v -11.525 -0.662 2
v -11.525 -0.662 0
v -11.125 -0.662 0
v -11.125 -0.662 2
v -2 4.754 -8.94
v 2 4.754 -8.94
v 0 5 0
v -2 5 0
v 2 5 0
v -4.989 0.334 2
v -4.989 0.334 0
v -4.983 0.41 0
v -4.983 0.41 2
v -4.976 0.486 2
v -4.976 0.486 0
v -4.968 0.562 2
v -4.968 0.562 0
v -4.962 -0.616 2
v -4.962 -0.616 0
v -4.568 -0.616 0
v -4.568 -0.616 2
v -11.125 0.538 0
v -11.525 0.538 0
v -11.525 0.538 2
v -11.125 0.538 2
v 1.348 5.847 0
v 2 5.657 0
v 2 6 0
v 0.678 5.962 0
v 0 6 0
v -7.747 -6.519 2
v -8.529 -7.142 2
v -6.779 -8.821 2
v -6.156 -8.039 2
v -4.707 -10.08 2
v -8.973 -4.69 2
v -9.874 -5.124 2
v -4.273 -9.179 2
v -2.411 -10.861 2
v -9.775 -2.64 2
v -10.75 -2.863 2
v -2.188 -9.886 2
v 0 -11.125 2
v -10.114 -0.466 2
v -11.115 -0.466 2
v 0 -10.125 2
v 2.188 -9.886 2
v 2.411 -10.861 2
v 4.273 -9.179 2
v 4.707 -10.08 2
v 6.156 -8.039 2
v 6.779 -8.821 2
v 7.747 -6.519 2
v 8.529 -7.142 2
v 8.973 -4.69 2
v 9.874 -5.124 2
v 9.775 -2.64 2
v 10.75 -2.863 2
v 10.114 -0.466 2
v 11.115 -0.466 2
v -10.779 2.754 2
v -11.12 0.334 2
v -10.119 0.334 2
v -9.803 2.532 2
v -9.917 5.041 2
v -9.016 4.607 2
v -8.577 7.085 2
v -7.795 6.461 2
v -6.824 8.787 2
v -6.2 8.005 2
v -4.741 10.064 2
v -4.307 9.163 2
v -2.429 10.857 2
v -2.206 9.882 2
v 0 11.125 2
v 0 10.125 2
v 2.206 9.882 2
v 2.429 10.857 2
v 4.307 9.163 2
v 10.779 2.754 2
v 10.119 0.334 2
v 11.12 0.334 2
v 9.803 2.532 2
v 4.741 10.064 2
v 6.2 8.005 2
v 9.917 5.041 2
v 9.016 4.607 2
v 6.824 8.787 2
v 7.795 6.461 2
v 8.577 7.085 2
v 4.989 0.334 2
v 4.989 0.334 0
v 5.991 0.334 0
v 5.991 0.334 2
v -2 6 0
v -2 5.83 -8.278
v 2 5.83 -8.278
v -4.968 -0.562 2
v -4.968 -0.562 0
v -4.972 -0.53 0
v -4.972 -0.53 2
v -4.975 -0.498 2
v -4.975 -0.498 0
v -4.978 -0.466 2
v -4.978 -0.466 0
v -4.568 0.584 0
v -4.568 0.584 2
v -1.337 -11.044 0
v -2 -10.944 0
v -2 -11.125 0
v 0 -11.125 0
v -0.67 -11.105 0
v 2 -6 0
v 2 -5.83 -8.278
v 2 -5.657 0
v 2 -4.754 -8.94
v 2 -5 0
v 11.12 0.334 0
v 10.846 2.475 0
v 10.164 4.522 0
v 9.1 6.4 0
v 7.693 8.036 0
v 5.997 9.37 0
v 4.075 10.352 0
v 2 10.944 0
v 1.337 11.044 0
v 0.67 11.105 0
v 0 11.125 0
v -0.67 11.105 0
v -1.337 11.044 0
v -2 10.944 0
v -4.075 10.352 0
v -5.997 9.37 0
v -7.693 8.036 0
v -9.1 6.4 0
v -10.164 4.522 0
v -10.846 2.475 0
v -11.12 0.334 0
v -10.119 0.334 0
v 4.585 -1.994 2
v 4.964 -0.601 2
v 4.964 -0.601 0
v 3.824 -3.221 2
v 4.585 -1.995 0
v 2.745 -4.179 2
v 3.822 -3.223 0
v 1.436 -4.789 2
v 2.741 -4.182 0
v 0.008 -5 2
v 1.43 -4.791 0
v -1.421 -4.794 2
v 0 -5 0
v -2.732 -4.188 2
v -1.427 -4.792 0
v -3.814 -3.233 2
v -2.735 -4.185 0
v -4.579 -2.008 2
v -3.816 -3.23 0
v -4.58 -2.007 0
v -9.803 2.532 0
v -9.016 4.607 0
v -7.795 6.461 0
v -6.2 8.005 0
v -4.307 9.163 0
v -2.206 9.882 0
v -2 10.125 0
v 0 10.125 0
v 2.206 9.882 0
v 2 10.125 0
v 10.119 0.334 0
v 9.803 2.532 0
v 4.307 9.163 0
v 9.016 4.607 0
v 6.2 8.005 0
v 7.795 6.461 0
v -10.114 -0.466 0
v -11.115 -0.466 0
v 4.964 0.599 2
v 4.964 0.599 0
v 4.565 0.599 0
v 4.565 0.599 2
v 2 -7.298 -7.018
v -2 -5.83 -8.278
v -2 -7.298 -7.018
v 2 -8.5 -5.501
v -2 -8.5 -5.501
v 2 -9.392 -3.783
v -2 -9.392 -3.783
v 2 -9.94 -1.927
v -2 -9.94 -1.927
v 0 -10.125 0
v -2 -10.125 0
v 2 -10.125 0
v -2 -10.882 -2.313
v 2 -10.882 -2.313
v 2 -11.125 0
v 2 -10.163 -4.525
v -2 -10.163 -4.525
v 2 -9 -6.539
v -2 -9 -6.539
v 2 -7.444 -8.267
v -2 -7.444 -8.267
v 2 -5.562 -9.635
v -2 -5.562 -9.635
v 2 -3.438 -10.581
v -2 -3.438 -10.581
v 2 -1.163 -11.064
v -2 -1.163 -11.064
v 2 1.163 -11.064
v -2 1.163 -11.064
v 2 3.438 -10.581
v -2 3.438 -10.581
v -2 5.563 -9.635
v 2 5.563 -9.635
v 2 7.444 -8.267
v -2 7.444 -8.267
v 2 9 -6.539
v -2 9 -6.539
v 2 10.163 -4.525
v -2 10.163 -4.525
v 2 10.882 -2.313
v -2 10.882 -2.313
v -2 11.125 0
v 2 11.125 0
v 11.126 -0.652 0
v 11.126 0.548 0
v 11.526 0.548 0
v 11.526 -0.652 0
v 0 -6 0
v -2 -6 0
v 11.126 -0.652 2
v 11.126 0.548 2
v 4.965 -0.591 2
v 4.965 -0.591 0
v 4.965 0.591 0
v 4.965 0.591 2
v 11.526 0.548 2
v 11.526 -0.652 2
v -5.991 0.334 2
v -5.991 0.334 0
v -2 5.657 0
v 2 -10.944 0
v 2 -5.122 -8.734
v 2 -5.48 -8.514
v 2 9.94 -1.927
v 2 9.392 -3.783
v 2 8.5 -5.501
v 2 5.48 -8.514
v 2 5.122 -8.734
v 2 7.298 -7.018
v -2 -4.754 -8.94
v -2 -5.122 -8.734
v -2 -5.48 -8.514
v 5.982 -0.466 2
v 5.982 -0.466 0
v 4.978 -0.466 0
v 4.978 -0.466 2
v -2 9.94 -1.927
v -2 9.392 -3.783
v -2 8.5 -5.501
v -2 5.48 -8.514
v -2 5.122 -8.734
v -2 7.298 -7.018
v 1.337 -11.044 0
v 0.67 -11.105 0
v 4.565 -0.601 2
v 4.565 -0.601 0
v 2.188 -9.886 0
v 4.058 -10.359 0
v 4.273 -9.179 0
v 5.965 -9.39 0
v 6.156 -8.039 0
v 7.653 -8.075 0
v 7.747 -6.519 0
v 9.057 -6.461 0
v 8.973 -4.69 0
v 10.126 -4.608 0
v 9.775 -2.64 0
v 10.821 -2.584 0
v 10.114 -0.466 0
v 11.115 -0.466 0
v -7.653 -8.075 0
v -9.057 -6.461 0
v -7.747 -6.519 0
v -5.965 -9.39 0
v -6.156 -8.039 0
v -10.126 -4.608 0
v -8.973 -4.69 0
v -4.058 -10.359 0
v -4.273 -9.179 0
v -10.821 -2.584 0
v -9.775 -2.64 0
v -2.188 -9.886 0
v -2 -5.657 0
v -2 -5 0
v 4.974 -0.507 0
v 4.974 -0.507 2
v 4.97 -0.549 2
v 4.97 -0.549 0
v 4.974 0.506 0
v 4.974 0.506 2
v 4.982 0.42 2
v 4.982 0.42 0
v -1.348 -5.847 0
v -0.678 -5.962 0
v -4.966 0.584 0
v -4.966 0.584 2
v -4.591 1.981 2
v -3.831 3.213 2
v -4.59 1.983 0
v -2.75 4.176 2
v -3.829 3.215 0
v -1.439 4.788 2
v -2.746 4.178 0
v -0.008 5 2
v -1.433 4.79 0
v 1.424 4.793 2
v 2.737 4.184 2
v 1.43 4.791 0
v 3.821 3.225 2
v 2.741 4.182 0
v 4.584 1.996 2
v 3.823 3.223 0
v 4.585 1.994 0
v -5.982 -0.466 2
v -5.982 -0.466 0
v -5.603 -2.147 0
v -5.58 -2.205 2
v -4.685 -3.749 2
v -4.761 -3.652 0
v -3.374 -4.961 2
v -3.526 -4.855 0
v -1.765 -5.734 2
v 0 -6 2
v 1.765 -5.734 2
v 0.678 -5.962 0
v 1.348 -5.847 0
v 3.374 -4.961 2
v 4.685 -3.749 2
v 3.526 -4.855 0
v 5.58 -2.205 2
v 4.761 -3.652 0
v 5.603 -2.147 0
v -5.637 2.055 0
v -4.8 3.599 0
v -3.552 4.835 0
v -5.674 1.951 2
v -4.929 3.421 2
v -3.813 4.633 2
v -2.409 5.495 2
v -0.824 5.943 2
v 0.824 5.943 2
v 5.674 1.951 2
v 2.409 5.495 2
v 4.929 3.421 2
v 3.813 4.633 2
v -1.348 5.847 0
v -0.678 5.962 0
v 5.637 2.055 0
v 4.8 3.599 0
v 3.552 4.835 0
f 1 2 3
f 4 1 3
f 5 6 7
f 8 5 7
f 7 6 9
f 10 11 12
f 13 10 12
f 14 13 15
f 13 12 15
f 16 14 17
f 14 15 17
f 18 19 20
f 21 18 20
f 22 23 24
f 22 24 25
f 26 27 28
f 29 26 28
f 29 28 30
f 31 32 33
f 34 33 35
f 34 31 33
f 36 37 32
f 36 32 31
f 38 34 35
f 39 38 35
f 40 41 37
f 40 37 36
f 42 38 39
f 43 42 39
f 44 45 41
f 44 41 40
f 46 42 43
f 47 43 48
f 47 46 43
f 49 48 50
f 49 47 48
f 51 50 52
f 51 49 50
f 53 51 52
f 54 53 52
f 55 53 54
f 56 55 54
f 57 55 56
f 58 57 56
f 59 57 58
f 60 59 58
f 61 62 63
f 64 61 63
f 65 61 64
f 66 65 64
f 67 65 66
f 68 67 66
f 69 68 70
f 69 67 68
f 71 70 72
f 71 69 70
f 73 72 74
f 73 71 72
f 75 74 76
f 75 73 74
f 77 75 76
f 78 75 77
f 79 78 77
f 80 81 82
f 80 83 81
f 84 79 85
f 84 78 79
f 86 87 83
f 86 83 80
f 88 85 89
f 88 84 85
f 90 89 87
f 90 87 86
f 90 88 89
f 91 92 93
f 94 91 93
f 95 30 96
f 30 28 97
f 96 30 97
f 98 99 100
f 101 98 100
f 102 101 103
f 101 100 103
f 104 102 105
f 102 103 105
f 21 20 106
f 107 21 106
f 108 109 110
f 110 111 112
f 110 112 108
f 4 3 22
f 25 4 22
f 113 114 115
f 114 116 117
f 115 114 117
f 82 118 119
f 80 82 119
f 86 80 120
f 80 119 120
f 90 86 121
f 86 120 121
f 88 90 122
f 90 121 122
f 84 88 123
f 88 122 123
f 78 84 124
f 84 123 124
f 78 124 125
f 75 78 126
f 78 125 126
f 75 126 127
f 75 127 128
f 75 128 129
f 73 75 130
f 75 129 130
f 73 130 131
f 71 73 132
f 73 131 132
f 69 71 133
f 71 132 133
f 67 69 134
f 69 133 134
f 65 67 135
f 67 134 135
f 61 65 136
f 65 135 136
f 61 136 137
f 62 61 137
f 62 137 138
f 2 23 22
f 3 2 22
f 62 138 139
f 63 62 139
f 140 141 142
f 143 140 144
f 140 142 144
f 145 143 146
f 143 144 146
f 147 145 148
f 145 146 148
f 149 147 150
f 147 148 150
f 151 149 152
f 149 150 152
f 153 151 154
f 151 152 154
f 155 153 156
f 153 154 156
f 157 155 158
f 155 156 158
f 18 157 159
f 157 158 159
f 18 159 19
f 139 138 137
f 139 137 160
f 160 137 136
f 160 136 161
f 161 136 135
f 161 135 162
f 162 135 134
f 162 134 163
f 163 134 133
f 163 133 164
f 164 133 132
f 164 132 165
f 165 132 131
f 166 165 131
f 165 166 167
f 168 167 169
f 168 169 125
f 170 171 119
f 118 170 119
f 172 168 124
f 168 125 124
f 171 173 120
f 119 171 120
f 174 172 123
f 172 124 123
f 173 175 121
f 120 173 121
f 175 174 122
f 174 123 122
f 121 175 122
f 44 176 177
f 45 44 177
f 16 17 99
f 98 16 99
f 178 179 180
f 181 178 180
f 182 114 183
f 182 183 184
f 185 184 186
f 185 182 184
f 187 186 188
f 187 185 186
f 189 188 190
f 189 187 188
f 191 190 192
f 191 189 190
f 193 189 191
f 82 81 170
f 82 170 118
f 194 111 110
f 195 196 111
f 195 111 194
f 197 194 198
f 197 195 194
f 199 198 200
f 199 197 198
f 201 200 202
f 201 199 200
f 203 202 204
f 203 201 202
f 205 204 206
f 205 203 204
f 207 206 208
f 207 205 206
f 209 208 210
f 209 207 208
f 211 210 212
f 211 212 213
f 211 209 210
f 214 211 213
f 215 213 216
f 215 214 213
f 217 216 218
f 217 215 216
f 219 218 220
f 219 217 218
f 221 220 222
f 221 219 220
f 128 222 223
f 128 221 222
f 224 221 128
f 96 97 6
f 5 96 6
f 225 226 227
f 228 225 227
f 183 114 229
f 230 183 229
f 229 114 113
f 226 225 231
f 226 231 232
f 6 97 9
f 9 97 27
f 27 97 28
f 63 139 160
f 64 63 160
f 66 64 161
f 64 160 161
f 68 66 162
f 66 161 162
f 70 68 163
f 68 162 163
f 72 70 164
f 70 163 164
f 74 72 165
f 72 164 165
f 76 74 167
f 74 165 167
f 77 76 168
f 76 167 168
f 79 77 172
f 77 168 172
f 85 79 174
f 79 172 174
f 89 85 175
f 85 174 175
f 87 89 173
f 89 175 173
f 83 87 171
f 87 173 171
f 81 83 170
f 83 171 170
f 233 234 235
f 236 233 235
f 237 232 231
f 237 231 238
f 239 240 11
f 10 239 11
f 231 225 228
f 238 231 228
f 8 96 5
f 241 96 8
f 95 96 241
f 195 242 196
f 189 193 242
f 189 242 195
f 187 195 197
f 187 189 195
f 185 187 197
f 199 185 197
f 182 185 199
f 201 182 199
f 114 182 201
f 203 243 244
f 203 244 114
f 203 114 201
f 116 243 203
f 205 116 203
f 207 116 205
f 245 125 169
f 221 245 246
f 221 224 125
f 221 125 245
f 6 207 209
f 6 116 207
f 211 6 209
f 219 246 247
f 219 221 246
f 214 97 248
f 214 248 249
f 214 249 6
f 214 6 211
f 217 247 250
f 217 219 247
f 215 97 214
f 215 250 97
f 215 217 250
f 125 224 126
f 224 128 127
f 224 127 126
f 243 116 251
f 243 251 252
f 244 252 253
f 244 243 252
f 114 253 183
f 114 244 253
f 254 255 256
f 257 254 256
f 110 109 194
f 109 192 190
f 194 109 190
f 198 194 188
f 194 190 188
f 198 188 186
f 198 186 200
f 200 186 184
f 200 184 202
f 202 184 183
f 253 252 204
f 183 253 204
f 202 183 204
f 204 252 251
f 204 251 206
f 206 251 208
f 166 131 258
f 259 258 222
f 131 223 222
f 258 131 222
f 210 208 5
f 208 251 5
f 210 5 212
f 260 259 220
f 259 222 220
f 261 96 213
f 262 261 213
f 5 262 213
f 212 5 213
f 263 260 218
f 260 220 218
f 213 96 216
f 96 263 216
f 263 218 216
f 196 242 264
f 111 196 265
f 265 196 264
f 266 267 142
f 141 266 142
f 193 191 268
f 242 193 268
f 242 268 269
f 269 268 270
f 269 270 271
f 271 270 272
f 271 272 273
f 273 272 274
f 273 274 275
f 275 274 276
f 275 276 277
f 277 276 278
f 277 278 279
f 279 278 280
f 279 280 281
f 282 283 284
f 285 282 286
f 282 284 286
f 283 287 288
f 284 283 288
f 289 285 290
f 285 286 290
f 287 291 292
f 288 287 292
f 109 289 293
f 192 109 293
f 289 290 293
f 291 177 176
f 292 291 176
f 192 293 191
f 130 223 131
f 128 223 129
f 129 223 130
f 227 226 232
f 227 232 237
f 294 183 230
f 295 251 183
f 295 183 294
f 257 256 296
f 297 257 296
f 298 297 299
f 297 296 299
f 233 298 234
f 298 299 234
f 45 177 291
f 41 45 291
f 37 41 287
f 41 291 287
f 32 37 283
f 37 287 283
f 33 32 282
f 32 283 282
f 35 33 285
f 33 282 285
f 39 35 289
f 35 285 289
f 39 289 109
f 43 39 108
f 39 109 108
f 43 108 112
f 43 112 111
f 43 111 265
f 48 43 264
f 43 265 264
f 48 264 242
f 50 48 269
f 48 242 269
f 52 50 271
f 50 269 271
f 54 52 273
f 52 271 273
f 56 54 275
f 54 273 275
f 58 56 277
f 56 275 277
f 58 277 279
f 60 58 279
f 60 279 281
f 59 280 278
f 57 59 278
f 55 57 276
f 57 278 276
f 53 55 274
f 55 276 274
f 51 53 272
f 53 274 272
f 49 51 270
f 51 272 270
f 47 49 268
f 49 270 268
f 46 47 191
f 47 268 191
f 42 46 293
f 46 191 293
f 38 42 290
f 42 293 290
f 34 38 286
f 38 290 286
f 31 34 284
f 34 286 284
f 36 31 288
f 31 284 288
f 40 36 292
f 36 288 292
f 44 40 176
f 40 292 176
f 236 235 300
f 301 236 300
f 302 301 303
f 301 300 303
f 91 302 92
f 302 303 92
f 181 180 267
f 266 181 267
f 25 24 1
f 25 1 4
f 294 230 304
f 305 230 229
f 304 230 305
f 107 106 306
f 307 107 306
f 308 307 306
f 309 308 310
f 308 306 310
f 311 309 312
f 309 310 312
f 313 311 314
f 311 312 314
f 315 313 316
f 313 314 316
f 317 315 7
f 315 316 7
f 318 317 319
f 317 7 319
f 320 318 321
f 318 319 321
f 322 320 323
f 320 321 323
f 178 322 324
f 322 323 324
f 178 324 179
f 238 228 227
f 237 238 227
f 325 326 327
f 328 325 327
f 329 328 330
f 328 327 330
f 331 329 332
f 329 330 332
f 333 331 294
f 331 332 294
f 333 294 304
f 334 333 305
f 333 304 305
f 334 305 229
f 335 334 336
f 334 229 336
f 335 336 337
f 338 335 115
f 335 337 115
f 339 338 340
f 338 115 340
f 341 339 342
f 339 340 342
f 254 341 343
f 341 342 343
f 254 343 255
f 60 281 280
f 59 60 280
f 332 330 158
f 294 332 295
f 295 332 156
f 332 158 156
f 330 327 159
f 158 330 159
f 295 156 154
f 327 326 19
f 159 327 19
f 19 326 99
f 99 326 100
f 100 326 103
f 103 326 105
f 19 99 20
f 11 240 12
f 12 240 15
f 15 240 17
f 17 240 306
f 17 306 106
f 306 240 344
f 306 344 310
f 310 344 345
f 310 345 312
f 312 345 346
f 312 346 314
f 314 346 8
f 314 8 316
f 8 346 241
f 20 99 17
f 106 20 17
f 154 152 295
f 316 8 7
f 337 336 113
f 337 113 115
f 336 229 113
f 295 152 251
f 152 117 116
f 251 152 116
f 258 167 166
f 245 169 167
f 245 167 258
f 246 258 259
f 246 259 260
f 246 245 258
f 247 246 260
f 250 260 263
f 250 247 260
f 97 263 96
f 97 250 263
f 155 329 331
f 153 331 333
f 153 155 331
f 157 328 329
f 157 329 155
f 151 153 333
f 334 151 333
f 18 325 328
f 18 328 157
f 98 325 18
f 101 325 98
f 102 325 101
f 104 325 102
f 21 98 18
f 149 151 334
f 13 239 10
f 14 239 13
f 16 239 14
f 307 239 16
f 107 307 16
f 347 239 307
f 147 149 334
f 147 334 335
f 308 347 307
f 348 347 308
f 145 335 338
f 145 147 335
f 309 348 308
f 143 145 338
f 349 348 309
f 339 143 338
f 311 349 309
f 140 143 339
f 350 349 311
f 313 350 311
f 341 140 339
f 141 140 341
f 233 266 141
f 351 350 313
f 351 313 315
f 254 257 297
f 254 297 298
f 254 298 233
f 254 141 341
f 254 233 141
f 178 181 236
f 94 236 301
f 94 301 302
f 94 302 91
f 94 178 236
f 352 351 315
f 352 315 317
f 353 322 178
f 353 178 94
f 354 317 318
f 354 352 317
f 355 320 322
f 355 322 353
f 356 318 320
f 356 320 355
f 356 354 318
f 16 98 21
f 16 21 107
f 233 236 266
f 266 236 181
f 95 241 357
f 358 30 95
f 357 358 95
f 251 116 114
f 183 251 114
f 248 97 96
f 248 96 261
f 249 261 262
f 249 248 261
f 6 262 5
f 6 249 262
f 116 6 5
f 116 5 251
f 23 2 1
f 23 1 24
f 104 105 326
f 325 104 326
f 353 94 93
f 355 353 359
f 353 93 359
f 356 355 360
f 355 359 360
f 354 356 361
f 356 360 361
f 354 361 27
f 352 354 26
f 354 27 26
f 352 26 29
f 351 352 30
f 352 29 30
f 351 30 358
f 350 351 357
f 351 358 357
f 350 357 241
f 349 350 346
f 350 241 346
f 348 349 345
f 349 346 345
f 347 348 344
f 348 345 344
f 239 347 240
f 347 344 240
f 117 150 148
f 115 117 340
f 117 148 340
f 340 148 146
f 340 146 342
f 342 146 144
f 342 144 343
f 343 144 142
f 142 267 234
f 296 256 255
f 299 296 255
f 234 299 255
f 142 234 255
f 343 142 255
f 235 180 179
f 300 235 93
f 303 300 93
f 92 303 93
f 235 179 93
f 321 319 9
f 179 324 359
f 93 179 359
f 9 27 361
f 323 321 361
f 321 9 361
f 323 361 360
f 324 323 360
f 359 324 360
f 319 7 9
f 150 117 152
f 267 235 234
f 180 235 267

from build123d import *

# Parameters (mm, degrees)
SKETCH1_W             = 0.4
SKETCH1_H             = 1.2
BOSS_EXTRUDE6_DEPTH   = 2
BOSS_EXTRUDE6_2_DEPTH = 2
BOSS_EXTRUDE6_3_DEPTH = 2
BOSS_EXTRUDE6_4_DEPTH = 2
BOSS_EXTRUDE6_5_DEPTH = 2
BOSS_EXTRUDE9_DEPTH   = 2


with BuildPart() as part:
    # Sketch1 → Boss-Extrude6 (new body)
    with BuildSketch(Plane.XY):
        with Locations((11.325734145, -0.052379551)):
            Rectangle(SKETCH1_W, SKETCH1_H)
    extrude(amount=BOSS_EXTRUDE6_DEPTH)


with BuildPart() as body_2:
    # Sketch1 → Boss-Extrude6 2 (new body)
    with BuildSketch(Plane.XY):
        with BuildLine():
            Line((10.119474502, 0.334455981), (11.119971412, 0.334455981))
            ThreePointArc((11.119971412, 0.334455981), (0, 11.125), (-11.119971412, 0.334455981))
            Line((-11.119971412, 0.334455981), (-10.119474502, 0.334455981))
            ThreePointArc((-10.119474502, 0.334455981), (0, 10.125), (10.119474502, 0.334455981))
        make_face()
    extrude(amount=BOSS_EXTRUDE6_2_DEPTH)



with BuildPart() as body_3:
    # Sketch1 → Boss-Extrude6 3 (new body)
    with BuildSketch(Plane.XY):
        with BuildLine():
            ThreePointArc((-11.115255002, -0.465544019), (0, -11.125), (11.115255002, -0.465544019))
            Line((11.115255002, -0.465544019), (10.11429156, -0.465544019))
            ThreePointArc((10.11429156, -0.465544019), (0, -10.125), (-10.11429156, -0.465544019))
            Line((-10.11429156, -0.465544019), (-11.115255002, -0.465544019))
        make_face()
    extrude(amount=BOSS_EXTRUDE6_3_DEPTH)


with BuildPart() as body_4:
    # Sketch1 → Boss-Extrude6 4 (new body)
    with BuildSketch(Plane.XY):
        with BuildLine():
            Line((-4.96832272, 0.561933585), (-4.96832272, -0.561933585))
            ThreePointArc((-4.96832272, -0.561933585), (-4.973534725, -0.513762924), (-4.978279699, -0.465544019))
            Line((-4.978279699, -0.465544019), (-5.981911799, -0.465544019))
            ThreePointArc((-5.981911799, -0.465544019), (0, -6), (5.981911799, -0.465544019))
            Line((5.981911799, -0.465544019), (4.978279699, -0.465544019))
            ThreePointArc((4.978279699, -0.465544019), (4.972008711, -0.528326962), (4.964945975, -0.591025774))
            Line((4.964945975, -0.591025774), (4.964945975, 0.591025774))
            ThreePointArc((4.964945975, 0.591025774), (4.978526751, 0.462894577), (4.988801379, 0.334455981))
            Line((4.988801379, 0.334455981), (5.990671014, 0.334455981))
            ThreePointArc((5.990671014, 0.334455981), (0, 6), (-5.990671014, 0.334455981))
            Line((-5.990671014, 0.334455981), (-4.988801379, 0.334455981))
            ThreePointArc((-4.988801379, 0.334455981), (-4.979861102, 0.44831173), (-4.96832272, 0.561933585))
        make_face()
        with BuildLine():
            ThreePointArc((4.963778954, -0.600748279), (0.007811541, -4.999993898), (-4.961877617, -0.616255233))
            Line((-4.961877617, -0.616255233), (-4.56832272, -0.616255233))
            Line((-4.56832272, -0.616255233), (-4.56832272, 0.583744767))
            Line((-4.56832272, 0.583744767), (-4.965807291, 0.583744767))
            ThreePointArc((-4.965807291, 0.583744767), (-0.007808307, 4.999993903), (4.963959848, 0.599251721))
            Line((4.963959848, 0.599251721), (4.564945975, 0.599251721))
            Line((4.564945975, 0.599251721), (4.564945975, -0.600748279))
            Line((4.564945975, -0.600748279), (4.963778954, -0.600748279))
        make_face(mode=Mode.SUBTRACT)
    extrude(amount=BOSS_EXTRUDE6_4_DEPTH)


with BuildPart() as body_5:
    # Sketch1 → Boss-Extrude6 5 (new body)
    with BuildSketch(Plane.XY):
        with Locations((-11.324786406, -0.061923137)):
            Rectangle(SKETCH1_W, SKETCH1_H)
    extrude(amount=BOSS_EXTRUDE6_5_DEPTH)


with BuildPart() as body_2_1:
    add(body_2.part)

    add(body_3.part)  # Boss-Extrude9 merges body 3

    add(body_4.part)  # Boss-Extrude9 merges body 4
    # Sketch7 → Boss-Extrude9 (add, symmetric)
    with BuildSketch(Plane(origin=(0, 0, 0), x_dir=(0, 0, -1), z_dir=(1, 0, 0))):
        Polygon((8.939520925, -4.754007849), (8.278345179, -5.829633445), (0, -6), (0, -5), align=None)
        Polygon((8.278345179, 5.829633445), (8.939520925, 4.754007849), (0, 5), (0, 6), align=None)
        with BuildLine():
            ThreePointArc((0, 10.125), (10.125, 0), (0, -10.125))
            Line((0, -10.125), (0, -11.125))
            ThreePointArc((0, -11.125), (11.125, 0), (0, 11.125))
            Line((0, 11.125), (0, 10.125))
        make_face()
        with BuildLine():
            ThreePointArc((8.939520925, -4.754007849), (10.125, 0), (8.939520925, 4.754007849))
            Line((8.939520925, 4.754007849), (8.939520925, -4.754007849))
        make_face()
    extrude(amount=BOSS_EXTRUDE9_DEPTH, both=True)


solid = Compound([part.part, body_5.part, body_2_1.part])
